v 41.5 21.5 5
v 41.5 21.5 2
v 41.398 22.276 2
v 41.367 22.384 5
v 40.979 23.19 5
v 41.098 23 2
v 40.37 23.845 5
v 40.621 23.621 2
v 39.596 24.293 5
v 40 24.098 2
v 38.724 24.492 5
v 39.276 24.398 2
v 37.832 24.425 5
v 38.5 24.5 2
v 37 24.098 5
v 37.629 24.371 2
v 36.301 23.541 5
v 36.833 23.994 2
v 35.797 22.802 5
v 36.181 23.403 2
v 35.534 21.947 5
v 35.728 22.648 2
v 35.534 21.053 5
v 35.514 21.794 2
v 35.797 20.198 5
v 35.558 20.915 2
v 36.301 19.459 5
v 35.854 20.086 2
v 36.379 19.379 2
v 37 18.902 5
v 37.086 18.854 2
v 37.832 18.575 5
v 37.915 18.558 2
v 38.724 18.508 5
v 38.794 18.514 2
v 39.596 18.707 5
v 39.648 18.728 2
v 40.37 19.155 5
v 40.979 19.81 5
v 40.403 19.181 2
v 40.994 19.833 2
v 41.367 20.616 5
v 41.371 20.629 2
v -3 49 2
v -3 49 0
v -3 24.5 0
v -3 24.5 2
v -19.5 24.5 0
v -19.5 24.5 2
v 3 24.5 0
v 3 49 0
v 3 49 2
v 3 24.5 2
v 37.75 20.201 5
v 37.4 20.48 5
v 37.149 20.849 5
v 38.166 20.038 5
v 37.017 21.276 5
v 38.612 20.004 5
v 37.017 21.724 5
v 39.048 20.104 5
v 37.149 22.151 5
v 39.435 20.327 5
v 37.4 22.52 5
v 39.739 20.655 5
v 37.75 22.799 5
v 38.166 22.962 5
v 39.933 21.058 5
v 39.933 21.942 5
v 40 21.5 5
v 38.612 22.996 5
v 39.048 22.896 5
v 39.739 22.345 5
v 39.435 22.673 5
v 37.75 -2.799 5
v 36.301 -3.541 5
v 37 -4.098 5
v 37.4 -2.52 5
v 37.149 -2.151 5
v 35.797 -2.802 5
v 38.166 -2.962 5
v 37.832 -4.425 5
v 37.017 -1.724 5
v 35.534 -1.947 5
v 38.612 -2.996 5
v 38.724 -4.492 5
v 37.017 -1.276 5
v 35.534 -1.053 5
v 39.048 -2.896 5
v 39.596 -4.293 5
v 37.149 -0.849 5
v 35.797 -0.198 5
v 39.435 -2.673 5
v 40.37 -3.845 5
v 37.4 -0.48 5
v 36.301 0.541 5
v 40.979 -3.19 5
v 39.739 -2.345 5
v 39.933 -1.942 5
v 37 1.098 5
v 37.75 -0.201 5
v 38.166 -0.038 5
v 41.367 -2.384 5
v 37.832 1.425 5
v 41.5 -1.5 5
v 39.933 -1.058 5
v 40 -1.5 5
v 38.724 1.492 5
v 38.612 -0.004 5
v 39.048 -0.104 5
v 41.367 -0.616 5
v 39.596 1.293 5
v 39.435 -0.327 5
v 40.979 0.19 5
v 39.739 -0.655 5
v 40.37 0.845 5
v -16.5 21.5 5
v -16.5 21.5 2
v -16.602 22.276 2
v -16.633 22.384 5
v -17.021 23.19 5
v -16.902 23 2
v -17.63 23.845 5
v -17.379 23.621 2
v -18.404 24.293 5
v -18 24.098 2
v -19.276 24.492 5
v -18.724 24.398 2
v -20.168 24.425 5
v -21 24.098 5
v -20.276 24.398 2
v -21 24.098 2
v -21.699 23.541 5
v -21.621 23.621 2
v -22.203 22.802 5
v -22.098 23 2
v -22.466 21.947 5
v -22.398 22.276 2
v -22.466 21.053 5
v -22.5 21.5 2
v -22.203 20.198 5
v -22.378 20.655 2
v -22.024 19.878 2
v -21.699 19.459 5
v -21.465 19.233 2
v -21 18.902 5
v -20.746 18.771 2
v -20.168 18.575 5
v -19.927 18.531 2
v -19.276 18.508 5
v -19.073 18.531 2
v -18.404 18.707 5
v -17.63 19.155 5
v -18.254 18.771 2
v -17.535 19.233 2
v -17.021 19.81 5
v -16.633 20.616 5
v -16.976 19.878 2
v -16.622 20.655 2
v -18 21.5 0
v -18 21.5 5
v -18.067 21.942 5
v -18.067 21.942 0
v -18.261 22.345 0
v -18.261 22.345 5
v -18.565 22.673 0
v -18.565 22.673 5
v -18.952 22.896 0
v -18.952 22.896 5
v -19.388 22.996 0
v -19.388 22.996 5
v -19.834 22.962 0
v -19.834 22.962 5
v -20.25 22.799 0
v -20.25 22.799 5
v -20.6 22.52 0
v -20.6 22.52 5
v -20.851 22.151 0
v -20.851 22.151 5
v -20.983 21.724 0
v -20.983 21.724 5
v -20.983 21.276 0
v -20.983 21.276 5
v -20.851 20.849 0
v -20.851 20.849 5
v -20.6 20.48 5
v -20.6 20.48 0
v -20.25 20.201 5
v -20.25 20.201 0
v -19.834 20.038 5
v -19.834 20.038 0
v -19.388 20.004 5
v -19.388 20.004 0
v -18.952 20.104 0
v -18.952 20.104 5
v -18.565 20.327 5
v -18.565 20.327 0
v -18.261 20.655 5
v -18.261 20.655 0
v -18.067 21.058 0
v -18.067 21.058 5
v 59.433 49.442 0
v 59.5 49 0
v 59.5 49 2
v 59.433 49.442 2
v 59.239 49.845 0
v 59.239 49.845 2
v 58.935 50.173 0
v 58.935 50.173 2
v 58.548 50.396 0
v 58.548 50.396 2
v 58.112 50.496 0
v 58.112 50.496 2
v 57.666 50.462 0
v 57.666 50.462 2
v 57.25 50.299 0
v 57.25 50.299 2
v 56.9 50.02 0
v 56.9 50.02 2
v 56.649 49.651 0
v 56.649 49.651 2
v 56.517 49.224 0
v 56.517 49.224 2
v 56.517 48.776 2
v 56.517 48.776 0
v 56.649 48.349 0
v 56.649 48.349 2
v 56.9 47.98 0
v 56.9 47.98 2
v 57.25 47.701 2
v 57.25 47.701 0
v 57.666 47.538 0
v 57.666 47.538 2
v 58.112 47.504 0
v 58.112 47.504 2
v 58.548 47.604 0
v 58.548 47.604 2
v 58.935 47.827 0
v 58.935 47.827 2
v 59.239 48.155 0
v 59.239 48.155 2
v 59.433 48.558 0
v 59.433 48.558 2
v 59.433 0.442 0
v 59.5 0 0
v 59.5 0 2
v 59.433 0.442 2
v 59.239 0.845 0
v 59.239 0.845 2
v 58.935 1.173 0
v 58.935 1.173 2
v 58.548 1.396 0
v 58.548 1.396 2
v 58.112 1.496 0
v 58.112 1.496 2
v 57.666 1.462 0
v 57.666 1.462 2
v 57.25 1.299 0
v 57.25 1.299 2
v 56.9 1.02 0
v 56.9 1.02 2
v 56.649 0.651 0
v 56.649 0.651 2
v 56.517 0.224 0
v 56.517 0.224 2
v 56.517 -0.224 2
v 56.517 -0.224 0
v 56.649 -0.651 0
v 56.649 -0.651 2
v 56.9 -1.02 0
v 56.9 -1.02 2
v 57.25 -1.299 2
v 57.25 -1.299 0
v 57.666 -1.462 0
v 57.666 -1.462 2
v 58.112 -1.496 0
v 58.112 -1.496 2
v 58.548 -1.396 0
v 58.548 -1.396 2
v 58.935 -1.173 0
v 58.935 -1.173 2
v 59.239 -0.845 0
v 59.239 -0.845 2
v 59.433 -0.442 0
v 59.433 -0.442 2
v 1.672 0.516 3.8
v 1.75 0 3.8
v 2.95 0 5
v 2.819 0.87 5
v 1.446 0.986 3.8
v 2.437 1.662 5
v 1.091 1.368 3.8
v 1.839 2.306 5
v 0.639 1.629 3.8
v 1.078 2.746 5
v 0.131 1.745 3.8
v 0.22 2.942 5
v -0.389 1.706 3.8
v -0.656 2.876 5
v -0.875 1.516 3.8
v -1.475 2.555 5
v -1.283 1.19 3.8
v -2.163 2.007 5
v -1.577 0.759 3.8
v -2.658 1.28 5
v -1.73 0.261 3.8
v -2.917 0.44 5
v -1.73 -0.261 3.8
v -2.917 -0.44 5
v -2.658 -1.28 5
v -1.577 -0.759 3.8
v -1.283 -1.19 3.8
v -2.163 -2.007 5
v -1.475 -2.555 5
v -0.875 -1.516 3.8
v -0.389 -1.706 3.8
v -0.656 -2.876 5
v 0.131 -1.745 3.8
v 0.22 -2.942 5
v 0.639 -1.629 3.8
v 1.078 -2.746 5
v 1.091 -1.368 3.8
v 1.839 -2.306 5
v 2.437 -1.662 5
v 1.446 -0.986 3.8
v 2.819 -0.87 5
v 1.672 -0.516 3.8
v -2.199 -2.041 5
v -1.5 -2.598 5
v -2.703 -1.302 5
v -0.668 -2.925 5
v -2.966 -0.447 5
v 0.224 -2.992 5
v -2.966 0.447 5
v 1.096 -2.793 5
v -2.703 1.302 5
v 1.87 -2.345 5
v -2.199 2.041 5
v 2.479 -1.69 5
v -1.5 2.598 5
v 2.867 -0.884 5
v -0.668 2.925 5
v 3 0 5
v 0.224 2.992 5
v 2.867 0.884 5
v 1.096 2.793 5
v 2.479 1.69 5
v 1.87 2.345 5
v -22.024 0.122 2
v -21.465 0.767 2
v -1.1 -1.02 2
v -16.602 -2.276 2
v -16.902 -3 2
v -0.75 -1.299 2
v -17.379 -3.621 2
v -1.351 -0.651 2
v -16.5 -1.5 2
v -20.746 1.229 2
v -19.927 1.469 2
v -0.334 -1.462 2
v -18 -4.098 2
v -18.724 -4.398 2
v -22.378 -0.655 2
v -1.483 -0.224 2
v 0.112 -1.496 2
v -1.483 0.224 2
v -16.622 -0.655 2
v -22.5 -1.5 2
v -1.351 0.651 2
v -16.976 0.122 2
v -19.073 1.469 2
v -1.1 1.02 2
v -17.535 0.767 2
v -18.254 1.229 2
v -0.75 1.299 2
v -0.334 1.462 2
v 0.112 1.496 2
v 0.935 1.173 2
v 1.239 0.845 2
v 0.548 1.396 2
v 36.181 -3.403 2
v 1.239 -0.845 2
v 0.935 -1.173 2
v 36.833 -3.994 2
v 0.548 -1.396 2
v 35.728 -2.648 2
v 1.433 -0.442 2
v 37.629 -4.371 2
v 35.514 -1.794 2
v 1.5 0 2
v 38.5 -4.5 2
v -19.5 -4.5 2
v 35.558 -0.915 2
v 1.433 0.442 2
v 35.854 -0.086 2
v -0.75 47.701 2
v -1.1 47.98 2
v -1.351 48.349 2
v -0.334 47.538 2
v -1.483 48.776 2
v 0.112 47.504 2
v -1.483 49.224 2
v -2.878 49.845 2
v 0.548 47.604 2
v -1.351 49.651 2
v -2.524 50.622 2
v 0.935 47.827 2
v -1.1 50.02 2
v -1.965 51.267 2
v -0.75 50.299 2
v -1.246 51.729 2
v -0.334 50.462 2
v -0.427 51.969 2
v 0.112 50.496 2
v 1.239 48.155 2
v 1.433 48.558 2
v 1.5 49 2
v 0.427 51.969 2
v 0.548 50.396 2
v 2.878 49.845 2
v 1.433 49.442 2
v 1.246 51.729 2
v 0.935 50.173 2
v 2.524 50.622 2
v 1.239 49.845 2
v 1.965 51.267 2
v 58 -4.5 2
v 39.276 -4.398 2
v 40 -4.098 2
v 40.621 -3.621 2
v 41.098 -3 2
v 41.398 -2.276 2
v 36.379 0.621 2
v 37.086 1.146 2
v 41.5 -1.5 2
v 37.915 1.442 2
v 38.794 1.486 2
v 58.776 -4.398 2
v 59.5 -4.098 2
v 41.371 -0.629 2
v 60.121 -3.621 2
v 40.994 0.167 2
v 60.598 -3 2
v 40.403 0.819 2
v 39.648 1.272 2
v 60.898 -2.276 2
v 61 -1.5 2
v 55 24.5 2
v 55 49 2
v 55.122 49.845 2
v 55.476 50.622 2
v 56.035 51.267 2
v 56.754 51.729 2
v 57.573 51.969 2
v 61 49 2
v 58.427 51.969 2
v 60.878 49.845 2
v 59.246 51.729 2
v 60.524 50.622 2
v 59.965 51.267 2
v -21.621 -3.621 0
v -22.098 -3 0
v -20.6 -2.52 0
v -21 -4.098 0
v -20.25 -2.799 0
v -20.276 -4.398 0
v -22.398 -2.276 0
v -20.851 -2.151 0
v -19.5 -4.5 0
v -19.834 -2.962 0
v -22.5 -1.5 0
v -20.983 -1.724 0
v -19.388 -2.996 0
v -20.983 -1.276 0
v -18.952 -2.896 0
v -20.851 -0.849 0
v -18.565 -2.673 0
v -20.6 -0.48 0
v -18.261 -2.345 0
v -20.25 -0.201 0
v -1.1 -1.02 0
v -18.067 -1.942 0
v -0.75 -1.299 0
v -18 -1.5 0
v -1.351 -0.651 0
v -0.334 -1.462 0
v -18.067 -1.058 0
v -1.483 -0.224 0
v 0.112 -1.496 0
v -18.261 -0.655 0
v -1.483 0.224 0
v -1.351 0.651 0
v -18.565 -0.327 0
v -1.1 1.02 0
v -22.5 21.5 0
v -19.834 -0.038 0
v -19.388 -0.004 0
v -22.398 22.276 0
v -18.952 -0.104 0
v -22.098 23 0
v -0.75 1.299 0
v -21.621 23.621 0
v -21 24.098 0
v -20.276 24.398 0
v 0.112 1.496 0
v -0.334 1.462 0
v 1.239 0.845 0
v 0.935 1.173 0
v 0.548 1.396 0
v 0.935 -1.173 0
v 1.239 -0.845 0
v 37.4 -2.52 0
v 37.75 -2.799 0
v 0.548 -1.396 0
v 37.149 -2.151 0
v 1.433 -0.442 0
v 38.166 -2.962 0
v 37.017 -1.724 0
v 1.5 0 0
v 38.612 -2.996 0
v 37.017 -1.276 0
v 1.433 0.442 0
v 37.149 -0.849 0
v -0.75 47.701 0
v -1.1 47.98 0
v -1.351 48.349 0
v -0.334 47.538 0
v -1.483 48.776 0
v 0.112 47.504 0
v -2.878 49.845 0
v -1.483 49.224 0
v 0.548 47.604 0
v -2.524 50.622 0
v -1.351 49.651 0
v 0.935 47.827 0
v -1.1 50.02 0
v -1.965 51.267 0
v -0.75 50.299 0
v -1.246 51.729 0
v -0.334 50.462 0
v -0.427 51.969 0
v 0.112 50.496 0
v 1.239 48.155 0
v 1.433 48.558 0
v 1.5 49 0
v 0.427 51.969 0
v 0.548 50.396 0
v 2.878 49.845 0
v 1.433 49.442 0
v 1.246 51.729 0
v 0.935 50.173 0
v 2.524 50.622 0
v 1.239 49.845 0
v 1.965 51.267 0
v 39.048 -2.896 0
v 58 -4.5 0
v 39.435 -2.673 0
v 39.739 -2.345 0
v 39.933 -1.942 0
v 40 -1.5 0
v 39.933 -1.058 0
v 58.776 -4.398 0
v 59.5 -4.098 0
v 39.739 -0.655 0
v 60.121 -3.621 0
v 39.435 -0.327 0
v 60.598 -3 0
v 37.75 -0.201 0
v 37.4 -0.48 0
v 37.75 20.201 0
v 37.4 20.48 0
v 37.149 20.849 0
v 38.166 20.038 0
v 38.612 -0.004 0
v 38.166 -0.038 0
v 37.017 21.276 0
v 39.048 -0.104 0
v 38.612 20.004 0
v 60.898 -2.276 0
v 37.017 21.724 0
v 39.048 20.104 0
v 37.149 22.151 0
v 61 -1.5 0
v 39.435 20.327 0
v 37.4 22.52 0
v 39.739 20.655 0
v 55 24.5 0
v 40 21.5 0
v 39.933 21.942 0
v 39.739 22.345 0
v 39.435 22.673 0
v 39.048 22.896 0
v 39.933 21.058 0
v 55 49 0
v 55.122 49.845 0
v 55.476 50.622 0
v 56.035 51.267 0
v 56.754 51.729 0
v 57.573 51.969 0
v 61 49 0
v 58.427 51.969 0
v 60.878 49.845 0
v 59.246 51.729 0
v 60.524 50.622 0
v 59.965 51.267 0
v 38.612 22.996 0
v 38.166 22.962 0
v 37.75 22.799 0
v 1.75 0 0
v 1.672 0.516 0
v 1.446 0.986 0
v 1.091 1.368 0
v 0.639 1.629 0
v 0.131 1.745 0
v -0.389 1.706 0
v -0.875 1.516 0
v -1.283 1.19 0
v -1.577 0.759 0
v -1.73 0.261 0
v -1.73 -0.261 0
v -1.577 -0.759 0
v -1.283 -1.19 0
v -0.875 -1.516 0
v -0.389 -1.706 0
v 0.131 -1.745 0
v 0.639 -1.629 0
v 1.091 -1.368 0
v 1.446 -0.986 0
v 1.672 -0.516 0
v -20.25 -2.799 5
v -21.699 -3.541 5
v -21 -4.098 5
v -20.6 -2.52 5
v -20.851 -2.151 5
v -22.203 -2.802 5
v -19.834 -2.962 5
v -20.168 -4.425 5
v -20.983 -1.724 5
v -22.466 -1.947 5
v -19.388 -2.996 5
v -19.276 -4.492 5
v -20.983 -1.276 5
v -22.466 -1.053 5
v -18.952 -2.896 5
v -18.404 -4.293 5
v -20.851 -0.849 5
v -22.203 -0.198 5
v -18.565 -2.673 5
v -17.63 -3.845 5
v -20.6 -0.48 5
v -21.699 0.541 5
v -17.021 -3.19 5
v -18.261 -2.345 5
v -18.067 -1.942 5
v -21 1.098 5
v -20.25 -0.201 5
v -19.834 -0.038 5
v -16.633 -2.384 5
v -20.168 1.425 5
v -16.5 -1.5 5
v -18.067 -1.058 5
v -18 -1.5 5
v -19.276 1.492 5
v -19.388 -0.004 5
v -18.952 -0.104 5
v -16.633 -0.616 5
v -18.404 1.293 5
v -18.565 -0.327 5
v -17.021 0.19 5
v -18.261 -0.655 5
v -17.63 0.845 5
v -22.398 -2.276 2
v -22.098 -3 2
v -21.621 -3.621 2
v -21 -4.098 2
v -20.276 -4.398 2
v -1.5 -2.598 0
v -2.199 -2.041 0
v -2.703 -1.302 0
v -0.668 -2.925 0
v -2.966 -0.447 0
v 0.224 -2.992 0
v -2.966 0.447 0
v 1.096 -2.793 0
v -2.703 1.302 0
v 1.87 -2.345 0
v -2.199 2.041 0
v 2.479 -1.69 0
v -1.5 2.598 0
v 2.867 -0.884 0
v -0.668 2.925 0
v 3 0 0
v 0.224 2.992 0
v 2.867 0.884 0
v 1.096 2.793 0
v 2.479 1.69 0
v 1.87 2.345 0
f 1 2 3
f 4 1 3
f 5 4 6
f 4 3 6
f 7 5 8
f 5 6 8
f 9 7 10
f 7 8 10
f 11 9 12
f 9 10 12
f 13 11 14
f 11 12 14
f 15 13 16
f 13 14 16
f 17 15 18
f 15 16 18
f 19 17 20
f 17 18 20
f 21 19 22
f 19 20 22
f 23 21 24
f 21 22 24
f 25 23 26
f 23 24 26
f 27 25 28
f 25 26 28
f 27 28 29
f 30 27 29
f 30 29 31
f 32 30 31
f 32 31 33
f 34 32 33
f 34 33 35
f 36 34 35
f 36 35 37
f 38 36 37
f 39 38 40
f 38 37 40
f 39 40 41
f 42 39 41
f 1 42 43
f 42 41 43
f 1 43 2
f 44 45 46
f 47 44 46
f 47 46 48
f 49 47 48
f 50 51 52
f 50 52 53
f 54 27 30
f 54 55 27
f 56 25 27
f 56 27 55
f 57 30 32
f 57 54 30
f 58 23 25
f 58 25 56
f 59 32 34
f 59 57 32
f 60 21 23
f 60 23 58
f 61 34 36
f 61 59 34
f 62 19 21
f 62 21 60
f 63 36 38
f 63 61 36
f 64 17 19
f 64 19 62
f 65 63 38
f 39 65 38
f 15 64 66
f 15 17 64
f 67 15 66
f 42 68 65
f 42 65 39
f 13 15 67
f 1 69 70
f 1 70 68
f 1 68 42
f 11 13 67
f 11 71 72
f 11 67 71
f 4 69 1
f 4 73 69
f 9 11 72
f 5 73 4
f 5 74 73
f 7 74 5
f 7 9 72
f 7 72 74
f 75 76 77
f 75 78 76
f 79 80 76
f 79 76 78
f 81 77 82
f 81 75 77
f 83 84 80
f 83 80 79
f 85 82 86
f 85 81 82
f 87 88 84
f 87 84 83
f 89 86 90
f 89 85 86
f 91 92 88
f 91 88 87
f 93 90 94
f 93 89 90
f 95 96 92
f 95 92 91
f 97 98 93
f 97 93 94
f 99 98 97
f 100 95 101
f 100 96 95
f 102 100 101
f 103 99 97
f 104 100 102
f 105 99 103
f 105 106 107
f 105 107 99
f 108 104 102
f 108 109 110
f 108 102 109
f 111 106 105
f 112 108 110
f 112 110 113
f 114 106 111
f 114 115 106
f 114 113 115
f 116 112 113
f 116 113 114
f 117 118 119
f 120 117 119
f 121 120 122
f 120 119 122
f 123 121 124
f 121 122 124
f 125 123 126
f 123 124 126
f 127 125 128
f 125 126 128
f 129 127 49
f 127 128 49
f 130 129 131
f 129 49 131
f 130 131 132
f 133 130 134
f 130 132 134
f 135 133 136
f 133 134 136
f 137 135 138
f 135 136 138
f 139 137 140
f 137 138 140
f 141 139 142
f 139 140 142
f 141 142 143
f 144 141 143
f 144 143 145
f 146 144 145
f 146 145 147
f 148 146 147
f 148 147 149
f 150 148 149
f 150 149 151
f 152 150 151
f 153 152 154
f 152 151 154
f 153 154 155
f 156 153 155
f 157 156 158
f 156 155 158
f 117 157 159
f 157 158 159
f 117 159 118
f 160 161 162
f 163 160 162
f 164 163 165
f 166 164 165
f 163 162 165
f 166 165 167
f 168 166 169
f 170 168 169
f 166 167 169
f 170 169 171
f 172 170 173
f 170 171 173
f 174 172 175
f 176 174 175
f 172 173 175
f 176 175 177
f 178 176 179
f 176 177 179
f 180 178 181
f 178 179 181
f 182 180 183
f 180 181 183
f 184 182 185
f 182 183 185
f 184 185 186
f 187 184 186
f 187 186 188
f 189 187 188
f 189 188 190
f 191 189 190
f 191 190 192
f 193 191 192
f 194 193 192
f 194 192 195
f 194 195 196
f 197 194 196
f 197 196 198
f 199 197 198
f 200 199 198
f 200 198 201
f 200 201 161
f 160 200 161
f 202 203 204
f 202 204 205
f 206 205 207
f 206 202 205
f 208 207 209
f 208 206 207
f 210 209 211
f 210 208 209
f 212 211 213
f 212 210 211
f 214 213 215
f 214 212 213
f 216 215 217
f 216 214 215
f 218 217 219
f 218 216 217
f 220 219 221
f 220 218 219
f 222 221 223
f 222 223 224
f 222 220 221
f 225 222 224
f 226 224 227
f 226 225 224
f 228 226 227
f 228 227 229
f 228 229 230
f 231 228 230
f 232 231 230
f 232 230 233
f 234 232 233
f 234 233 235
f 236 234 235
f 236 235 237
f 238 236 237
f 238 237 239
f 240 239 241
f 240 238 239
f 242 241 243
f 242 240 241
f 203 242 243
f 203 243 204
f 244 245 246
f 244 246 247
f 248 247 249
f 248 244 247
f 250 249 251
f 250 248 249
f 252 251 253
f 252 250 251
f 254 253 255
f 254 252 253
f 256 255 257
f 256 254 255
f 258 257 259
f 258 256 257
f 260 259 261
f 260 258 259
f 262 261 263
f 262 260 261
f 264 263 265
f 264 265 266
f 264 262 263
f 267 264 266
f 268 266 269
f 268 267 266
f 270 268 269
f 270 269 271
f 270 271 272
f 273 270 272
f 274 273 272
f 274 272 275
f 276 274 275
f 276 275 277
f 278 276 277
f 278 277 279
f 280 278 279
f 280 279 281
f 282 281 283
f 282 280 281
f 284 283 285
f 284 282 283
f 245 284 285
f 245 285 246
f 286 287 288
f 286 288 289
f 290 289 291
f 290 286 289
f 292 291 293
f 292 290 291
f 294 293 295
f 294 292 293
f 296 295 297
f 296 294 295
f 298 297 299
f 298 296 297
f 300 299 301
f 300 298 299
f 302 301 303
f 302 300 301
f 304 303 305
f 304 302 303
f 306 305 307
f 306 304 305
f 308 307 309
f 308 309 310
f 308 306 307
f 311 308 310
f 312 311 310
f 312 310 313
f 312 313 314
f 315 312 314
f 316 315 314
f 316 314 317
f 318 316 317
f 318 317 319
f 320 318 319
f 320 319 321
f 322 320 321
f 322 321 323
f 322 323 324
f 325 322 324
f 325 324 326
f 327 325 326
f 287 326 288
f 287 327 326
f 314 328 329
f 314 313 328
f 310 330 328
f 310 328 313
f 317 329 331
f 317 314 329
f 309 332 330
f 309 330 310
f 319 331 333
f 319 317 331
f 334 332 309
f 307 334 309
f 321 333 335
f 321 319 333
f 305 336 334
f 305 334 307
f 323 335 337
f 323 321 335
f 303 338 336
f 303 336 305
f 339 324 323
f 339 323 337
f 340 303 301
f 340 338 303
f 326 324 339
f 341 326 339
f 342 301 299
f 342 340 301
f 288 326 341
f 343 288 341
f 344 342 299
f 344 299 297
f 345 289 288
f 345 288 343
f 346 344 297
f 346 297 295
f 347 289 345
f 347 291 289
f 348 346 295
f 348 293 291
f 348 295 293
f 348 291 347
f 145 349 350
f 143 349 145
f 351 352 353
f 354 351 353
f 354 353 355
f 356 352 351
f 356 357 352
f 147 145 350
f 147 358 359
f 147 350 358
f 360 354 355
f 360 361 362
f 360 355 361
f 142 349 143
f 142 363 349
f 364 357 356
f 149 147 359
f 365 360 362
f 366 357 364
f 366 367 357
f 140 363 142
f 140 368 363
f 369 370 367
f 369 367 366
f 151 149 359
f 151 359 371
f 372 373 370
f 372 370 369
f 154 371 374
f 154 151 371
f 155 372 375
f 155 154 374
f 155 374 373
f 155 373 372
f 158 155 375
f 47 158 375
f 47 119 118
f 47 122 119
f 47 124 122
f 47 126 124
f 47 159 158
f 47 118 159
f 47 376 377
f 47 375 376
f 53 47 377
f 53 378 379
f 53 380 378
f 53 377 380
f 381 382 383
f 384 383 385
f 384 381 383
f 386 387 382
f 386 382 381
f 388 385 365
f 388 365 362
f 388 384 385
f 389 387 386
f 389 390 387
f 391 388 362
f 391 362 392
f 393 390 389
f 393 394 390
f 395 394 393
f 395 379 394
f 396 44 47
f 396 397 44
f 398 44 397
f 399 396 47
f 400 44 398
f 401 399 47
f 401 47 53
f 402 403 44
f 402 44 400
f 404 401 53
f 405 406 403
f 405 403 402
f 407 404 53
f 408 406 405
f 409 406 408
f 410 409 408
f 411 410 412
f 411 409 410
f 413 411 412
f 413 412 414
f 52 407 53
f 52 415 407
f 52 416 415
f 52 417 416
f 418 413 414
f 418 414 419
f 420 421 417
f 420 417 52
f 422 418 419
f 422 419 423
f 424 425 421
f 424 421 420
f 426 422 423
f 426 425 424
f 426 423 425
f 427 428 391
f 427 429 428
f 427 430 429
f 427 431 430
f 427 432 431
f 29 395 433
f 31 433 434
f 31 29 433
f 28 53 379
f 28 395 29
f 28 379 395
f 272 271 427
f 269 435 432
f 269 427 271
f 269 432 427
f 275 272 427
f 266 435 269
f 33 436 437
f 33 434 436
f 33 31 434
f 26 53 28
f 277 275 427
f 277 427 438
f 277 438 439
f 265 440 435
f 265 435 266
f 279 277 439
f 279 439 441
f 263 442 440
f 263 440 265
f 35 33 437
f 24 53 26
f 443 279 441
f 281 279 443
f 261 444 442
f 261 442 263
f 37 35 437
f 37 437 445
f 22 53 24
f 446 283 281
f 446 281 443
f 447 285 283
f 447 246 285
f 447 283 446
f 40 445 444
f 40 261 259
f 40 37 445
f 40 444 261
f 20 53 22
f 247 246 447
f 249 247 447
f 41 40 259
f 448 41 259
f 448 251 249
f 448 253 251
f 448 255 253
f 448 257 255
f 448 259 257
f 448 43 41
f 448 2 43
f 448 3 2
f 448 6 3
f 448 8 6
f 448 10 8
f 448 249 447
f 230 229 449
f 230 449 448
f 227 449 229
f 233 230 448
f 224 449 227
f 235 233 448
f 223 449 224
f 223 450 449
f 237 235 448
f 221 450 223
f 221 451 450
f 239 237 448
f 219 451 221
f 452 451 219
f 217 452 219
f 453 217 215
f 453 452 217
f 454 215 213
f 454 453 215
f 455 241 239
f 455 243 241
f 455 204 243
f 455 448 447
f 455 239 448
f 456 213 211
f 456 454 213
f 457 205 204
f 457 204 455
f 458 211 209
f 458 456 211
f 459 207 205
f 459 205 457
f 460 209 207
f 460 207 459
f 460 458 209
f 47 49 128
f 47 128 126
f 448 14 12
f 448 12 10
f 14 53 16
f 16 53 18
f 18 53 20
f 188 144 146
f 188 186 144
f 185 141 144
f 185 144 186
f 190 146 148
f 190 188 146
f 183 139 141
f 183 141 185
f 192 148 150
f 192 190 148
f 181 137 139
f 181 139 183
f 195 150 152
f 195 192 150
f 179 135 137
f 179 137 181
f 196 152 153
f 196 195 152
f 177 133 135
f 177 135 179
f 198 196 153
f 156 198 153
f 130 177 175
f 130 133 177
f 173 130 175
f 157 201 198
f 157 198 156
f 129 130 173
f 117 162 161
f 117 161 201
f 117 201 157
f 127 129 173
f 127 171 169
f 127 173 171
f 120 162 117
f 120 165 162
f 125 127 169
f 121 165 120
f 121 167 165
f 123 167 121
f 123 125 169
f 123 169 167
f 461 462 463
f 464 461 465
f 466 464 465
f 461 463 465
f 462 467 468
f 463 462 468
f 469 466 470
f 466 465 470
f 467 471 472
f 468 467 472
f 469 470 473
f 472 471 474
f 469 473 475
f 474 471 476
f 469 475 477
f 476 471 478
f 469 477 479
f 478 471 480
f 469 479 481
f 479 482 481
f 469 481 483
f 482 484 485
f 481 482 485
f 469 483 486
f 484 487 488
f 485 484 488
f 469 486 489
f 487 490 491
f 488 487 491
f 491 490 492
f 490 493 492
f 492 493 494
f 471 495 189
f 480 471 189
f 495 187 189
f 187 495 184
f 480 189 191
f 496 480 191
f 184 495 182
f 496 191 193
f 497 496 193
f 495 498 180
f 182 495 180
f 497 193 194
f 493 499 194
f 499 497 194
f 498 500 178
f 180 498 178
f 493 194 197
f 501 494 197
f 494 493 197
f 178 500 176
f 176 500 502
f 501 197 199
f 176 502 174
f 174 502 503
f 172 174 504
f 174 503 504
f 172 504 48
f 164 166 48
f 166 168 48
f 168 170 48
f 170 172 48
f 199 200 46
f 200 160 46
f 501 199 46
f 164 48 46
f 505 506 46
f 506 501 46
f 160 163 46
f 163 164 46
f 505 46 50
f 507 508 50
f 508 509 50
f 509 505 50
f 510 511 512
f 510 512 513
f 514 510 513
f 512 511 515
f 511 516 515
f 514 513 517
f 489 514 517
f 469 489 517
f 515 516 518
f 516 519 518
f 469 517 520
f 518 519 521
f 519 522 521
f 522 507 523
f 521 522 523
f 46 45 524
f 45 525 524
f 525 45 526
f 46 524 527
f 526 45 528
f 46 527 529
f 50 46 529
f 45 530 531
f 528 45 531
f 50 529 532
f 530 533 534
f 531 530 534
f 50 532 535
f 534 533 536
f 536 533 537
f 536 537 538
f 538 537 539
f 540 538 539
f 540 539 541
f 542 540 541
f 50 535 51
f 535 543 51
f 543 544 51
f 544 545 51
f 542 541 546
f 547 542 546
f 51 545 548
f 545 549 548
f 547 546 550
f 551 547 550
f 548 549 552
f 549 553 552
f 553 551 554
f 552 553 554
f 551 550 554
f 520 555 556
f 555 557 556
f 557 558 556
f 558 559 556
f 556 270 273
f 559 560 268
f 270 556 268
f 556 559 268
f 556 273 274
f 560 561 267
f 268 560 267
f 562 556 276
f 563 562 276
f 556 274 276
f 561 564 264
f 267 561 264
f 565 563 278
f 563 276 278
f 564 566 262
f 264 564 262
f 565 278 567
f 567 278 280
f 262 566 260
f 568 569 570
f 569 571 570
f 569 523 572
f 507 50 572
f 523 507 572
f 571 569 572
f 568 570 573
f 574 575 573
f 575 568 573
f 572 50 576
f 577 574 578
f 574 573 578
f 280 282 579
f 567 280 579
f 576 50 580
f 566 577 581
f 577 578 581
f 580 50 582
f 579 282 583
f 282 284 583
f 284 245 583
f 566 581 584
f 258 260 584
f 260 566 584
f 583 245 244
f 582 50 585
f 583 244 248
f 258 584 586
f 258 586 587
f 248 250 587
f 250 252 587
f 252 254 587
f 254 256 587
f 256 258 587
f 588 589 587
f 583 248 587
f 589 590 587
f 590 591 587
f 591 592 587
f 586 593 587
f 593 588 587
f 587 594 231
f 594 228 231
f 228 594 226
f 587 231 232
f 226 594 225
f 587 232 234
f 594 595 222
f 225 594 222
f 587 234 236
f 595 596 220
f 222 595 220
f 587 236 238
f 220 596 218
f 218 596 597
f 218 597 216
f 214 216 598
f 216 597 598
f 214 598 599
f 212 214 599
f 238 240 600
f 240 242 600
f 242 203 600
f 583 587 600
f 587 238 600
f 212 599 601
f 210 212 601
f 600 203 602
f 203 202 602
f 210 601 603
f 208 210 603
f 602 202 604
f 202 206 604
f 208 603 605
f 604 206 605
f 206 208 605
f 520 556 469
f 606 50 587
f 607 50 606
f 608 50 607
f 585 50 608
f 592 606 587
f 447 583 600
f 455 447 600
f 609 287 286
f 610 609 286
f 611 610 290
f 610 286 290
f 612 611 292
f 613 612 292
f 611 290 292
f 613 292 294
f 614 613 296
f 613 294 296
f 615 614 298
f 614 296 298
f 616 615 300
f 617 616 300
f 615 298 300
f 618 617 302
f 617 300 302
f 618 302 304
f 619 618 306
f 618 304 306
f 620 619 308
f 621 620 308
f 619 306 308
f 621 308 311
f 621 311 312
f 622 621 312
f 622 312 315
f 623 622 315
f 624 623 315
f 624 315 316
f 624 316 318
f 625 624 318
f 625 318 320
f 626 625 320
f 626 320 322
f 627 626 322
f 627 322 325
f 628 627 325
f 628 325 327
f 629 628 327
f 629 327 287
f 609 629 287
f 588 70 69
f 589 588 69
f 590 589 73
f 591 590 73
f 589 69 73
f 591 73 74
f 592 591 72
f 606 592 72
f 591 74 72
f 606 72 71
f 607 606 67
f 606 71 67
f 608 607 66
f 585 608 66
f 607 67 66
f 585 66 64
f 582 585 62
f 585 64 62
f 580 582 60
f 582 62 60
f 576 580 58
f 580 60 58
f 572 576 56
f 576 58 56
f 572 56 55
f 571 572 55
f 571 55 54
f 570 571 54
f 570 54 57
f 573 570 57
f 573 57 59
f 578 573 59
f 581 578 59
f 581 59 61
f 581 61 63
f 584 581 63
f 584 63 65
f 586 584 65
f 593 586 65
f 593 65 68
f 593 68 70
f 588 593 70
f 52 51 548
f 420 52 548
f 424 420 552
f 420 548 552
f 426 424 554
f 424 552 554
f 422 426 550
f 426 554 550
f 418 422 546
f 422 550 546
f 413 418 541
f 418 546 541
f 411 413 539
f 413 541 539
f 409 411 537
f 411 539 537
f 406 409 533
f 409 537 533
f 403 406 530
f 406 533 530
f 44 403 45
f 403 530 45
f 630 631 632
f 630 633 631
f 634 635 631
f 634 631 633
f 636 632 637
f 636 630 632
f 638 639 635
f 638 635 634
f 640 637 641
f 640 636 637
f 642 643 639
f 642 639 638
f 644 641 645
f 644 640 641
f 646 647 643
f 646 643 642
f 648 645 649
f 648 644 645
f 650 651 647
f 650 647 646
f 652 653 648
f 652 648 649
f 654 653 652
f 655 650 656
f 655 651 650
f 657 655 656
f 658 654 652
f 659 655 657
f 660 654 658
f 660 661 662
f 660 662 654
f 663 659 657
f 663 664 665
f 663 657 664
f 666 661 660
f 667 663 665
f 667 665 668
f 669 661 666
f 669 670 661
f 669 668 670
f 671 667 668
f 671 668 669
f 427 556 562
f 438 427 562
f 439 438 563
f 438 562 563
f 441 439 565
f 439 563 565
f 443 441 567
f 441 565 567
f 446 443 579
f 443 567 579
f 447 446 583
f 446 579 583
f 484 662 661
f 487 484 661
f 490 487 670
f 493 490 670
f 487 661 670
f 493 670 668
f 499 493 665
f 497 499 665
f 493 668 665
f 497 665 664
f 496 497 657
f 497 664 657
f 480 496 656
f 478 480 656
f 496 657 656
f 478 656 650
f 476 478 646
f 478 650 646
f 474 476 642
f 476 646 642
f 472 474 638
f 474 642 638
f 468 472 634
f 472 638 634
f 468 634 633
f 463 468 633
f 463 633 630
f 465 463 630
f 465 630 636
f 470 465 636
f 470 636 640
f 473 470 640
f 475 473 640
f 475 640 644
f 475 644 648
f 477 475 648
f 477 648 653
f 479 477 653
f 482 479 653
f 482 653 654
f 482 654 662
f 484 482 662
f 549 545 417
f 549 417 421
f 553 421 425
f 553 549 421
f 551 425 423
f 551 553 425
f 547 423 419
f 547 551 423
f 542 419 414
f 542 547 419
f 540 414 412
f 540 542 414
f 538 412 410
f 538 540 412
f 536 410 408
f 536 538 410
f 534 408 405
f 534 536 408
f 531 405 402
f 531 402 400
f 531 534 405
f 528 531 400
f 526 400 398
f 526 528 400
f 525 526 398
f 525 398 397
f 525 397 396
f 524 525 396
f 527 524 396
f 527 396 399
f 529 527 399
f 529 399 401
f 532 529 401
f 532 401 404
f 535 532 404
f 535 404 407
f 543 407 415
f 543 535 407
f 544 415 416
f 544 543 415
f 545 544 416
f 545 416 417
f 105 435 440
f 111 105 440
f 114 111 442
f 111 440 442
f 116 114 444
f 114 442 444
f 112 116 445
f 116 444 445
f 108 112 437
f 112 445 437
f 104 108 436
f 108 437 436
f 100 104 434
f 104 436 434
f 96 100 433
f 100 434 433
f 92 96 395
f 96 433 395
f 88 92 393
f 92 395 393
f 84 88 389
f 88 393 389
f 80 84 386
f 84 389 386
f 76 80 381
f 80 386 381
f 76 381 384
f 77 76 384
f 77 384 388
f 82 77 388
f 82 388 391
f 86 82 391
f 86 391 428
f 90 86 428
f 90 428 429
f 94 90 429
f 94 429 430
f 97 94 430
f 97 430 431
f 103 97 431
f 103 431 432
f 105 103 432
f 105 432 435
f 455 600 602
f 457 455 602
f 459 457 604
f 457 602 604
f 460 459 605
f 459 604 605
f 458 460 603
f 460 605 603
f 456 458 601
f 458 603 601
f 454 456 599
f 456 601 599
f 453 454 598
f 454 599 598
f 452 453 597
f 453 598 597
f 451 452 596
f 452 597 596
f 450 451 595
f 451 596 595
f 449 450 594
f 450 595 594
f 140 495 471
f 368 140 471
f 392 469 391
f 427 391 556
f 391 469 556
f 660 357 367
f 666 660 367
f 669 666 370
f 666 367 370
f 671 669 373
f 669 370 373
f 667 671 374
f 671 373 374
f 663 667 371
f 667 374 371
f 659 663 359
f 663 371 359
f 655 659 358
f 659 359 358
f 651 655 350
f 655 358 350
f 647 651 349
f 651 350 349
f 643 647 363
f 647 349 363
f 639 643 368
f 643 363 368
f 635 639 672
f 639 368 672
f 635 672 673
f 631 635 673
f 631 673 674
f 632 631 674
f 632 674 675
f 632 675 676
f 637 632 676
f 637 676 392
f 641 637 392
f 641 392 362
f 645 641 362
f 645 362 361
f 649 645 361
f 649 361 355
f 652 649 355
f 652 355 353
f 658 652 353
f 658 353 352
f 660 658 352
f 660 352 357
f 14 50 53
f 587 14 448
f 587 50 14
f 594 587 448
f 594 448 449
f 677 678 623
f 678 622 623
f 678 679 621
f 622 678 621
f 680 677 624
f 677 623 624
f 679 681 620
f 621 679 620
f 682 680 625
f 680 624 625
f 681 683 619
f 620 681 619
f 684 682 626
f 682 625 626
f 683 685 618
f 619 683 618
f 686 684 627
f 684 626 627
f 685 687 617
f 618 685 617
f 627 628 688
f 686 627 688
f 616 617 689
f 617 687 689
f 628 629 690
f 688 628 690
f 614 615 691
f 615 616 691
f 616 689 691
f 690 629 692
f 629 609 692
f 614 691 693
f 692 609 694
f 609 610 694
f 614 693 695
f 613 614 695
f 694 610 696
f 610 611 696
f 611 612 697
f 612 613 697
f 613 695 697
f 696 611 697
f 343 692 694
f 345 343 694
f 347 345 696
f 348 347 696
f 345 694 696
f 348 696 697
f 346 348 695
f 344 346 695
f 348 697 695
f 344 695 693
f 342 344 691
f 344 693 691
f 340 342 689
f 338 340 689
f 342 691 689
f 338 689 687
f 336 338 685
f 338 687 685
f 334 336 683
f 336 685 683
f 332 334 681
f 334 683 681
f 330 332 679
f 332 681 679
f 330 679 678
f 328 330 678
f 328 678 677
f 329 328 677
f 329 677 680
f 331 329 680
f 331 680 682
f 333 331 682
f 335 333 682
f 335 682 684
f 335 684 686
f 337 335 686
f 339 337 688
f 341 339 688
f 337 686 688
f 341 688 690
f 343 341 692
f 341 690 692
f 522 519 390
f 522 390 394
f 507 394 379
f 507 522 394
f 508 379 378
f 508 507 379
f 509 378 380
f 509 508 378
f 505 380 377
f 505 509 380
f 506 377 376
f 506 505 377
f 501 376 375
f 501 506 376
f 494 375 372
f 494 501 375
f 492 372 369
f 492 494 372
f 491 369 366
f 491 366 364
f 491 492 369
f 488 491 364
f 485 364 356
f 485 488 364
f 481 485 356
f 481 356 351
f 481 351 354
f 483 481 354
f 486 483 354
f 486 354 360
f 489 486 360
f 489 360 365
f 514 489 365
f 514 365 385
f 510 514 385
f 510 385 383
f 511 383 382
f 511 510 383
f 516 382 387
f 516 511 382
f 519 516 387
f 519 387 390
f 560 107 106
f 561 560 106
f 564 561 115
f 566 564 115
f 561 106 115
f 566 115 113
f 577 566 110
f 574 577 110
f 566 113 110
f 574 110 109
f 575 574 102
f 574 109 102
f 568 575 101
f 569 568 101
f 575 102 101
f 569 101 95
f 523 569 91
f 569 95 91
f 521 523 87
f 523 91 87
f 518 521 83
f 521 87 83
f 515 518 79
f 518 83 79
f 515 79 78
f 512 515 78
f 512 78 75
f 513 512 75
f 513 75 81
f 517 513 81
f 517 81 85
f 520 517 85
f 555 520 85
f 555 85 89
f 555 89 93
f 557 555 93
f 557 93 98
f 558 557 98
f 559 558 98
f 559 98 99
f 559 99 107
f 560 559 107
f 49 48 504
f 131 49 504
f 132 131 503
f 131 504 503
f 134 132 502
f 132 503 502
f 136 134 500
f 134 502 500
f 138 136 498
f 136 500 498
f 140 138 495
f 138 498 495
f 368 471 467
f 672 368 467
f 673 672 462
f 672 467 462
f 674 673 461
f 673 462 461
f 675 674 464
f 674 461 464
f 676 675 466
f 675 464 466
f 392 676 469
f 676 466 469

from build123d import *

# Parameters (mm, degrees)
SKETCH_R        = 1.5
PAD_DEPTH       = 2
SKETCH001_R     = 3
PAD001_DEPTH    = 3
SKETCH002_R     = 1.5
POCKET_DEPTH    = 5.001
SKETCH003_R     = 3
PAD002_DEPTH    = 5
SKETCH004_R     = 1.75
POCKET001_DEPTH = 5.001
CHAMFER_SIZE    = 1.2


with BuildPart() as body:
    # Sketch → Pad (new body)
    with BuildSketch(Plane.XY):
        with BuildLine():
            ThreePointArc((3, 49), (0, 52), (-3, 49))
            Line((-3, 49), (-3, 24.5))
            Line((-3, 24.5), (-19.5, 24.5))
            ThreePointArc((-19.5, 24.5), (-21.62132, 23.62132), (-22.5, 21.5))
            Line((-22.5, 21.5), (-22.5, -1.5))
            ThreePointArc((-22.5, -1.5), (-21.62132, -3.62132), (-19.5, -4.5))
            Line((-19.5, -4.5), (58, -4.5))
            ThreePointArc((58, -4.5), (60.121328, -3.621313), (61, -1.499979))
            Line((61, -1.499979), (61, 49))
            ThreePointArc((61, 49), (58, 52), (55, 49))
            Line((55, 24.5), (55, 49))
            Line((3, 24.5), (55, 24.5))
            Line((3, 49), (3, 24.5))
        make_face()
        Circle(SKETCH_R, mode=Mode.SUBTRACT)
        with Locations((58, 0)):
            Circle(SKETCH_R, mode=Mode.SUBTRACT)
        with Locations((0, 49)):
            Circle(SKETCH_R, mode=Mode.SUBTRACT)
        with Locations((58, 49)):
            Circle(SKETCH_R, mode=Mode.SUBTRACT)
    extrude(amount=PAD_DEPTH)

    # Sketch001 (on Face19 of Pad) → Pad001 (join)
    with BuildSketch(Plane.XY.offset(2)):
        with Locations((-19.5, 21.5)):
            Circle(SKETCH001_R)
        with Locations((-19.5, -1.5)):
            Circle(SKETCH001_R)
        with Locations((38.5, 21.5)):
            Circle(SKETCH001_R)
        with Locations((38.5, -1.5)):
            Circle(SKETCH001_R)
    extrude(amount=PAD001_DEPTH)

    # Sketch002 (on Face25 of Pad001) → Pocket (cut, through all)
    with BuildSketch(Plane.XY.offset(5)):
        with Locations((-19.5, 21.5)):
            Circle(SKETCH002_R)
        with Locations((-19.5, -1.5)):
            Circle(SKETCH002_R)
        with Locations((38.5, 21.5)):
            Circle(SKETCH002_R)
        with Locations((38.5, -1.5)):
            Circle(SKETCH002_R)
    extrude(amount=-POCKET_DEPTH, mode=Mode.SUBTRACT)


with BuildPart() as body001:
    # Sketch003 → Pad002 (new body)
    with BuildSketch(Plane.XY):
        Circle(SKETCH003_R)
    extrude(amount=PAD002_DEPTH)

    # Sketch004 (on Face3 of Pad002) → Pocket001 (cut, through all)
    with BuildSketch(Plane.XY.offset(5)):
        Circle(SKETCH004_R)
    extrude(amount=-POCKET001_DEPTH, mode=Mode.SUBTRACT)

    # Chamfer
    chamfer_edges = [body001.edges().sort_by_distance(p)[0] for p in [
        (-1.75, 0, 5),
    ]]
    chamfer(chamfer_edges, length=CHAMFER_SIZE)


solid = Compound([body.part, body001.part])
